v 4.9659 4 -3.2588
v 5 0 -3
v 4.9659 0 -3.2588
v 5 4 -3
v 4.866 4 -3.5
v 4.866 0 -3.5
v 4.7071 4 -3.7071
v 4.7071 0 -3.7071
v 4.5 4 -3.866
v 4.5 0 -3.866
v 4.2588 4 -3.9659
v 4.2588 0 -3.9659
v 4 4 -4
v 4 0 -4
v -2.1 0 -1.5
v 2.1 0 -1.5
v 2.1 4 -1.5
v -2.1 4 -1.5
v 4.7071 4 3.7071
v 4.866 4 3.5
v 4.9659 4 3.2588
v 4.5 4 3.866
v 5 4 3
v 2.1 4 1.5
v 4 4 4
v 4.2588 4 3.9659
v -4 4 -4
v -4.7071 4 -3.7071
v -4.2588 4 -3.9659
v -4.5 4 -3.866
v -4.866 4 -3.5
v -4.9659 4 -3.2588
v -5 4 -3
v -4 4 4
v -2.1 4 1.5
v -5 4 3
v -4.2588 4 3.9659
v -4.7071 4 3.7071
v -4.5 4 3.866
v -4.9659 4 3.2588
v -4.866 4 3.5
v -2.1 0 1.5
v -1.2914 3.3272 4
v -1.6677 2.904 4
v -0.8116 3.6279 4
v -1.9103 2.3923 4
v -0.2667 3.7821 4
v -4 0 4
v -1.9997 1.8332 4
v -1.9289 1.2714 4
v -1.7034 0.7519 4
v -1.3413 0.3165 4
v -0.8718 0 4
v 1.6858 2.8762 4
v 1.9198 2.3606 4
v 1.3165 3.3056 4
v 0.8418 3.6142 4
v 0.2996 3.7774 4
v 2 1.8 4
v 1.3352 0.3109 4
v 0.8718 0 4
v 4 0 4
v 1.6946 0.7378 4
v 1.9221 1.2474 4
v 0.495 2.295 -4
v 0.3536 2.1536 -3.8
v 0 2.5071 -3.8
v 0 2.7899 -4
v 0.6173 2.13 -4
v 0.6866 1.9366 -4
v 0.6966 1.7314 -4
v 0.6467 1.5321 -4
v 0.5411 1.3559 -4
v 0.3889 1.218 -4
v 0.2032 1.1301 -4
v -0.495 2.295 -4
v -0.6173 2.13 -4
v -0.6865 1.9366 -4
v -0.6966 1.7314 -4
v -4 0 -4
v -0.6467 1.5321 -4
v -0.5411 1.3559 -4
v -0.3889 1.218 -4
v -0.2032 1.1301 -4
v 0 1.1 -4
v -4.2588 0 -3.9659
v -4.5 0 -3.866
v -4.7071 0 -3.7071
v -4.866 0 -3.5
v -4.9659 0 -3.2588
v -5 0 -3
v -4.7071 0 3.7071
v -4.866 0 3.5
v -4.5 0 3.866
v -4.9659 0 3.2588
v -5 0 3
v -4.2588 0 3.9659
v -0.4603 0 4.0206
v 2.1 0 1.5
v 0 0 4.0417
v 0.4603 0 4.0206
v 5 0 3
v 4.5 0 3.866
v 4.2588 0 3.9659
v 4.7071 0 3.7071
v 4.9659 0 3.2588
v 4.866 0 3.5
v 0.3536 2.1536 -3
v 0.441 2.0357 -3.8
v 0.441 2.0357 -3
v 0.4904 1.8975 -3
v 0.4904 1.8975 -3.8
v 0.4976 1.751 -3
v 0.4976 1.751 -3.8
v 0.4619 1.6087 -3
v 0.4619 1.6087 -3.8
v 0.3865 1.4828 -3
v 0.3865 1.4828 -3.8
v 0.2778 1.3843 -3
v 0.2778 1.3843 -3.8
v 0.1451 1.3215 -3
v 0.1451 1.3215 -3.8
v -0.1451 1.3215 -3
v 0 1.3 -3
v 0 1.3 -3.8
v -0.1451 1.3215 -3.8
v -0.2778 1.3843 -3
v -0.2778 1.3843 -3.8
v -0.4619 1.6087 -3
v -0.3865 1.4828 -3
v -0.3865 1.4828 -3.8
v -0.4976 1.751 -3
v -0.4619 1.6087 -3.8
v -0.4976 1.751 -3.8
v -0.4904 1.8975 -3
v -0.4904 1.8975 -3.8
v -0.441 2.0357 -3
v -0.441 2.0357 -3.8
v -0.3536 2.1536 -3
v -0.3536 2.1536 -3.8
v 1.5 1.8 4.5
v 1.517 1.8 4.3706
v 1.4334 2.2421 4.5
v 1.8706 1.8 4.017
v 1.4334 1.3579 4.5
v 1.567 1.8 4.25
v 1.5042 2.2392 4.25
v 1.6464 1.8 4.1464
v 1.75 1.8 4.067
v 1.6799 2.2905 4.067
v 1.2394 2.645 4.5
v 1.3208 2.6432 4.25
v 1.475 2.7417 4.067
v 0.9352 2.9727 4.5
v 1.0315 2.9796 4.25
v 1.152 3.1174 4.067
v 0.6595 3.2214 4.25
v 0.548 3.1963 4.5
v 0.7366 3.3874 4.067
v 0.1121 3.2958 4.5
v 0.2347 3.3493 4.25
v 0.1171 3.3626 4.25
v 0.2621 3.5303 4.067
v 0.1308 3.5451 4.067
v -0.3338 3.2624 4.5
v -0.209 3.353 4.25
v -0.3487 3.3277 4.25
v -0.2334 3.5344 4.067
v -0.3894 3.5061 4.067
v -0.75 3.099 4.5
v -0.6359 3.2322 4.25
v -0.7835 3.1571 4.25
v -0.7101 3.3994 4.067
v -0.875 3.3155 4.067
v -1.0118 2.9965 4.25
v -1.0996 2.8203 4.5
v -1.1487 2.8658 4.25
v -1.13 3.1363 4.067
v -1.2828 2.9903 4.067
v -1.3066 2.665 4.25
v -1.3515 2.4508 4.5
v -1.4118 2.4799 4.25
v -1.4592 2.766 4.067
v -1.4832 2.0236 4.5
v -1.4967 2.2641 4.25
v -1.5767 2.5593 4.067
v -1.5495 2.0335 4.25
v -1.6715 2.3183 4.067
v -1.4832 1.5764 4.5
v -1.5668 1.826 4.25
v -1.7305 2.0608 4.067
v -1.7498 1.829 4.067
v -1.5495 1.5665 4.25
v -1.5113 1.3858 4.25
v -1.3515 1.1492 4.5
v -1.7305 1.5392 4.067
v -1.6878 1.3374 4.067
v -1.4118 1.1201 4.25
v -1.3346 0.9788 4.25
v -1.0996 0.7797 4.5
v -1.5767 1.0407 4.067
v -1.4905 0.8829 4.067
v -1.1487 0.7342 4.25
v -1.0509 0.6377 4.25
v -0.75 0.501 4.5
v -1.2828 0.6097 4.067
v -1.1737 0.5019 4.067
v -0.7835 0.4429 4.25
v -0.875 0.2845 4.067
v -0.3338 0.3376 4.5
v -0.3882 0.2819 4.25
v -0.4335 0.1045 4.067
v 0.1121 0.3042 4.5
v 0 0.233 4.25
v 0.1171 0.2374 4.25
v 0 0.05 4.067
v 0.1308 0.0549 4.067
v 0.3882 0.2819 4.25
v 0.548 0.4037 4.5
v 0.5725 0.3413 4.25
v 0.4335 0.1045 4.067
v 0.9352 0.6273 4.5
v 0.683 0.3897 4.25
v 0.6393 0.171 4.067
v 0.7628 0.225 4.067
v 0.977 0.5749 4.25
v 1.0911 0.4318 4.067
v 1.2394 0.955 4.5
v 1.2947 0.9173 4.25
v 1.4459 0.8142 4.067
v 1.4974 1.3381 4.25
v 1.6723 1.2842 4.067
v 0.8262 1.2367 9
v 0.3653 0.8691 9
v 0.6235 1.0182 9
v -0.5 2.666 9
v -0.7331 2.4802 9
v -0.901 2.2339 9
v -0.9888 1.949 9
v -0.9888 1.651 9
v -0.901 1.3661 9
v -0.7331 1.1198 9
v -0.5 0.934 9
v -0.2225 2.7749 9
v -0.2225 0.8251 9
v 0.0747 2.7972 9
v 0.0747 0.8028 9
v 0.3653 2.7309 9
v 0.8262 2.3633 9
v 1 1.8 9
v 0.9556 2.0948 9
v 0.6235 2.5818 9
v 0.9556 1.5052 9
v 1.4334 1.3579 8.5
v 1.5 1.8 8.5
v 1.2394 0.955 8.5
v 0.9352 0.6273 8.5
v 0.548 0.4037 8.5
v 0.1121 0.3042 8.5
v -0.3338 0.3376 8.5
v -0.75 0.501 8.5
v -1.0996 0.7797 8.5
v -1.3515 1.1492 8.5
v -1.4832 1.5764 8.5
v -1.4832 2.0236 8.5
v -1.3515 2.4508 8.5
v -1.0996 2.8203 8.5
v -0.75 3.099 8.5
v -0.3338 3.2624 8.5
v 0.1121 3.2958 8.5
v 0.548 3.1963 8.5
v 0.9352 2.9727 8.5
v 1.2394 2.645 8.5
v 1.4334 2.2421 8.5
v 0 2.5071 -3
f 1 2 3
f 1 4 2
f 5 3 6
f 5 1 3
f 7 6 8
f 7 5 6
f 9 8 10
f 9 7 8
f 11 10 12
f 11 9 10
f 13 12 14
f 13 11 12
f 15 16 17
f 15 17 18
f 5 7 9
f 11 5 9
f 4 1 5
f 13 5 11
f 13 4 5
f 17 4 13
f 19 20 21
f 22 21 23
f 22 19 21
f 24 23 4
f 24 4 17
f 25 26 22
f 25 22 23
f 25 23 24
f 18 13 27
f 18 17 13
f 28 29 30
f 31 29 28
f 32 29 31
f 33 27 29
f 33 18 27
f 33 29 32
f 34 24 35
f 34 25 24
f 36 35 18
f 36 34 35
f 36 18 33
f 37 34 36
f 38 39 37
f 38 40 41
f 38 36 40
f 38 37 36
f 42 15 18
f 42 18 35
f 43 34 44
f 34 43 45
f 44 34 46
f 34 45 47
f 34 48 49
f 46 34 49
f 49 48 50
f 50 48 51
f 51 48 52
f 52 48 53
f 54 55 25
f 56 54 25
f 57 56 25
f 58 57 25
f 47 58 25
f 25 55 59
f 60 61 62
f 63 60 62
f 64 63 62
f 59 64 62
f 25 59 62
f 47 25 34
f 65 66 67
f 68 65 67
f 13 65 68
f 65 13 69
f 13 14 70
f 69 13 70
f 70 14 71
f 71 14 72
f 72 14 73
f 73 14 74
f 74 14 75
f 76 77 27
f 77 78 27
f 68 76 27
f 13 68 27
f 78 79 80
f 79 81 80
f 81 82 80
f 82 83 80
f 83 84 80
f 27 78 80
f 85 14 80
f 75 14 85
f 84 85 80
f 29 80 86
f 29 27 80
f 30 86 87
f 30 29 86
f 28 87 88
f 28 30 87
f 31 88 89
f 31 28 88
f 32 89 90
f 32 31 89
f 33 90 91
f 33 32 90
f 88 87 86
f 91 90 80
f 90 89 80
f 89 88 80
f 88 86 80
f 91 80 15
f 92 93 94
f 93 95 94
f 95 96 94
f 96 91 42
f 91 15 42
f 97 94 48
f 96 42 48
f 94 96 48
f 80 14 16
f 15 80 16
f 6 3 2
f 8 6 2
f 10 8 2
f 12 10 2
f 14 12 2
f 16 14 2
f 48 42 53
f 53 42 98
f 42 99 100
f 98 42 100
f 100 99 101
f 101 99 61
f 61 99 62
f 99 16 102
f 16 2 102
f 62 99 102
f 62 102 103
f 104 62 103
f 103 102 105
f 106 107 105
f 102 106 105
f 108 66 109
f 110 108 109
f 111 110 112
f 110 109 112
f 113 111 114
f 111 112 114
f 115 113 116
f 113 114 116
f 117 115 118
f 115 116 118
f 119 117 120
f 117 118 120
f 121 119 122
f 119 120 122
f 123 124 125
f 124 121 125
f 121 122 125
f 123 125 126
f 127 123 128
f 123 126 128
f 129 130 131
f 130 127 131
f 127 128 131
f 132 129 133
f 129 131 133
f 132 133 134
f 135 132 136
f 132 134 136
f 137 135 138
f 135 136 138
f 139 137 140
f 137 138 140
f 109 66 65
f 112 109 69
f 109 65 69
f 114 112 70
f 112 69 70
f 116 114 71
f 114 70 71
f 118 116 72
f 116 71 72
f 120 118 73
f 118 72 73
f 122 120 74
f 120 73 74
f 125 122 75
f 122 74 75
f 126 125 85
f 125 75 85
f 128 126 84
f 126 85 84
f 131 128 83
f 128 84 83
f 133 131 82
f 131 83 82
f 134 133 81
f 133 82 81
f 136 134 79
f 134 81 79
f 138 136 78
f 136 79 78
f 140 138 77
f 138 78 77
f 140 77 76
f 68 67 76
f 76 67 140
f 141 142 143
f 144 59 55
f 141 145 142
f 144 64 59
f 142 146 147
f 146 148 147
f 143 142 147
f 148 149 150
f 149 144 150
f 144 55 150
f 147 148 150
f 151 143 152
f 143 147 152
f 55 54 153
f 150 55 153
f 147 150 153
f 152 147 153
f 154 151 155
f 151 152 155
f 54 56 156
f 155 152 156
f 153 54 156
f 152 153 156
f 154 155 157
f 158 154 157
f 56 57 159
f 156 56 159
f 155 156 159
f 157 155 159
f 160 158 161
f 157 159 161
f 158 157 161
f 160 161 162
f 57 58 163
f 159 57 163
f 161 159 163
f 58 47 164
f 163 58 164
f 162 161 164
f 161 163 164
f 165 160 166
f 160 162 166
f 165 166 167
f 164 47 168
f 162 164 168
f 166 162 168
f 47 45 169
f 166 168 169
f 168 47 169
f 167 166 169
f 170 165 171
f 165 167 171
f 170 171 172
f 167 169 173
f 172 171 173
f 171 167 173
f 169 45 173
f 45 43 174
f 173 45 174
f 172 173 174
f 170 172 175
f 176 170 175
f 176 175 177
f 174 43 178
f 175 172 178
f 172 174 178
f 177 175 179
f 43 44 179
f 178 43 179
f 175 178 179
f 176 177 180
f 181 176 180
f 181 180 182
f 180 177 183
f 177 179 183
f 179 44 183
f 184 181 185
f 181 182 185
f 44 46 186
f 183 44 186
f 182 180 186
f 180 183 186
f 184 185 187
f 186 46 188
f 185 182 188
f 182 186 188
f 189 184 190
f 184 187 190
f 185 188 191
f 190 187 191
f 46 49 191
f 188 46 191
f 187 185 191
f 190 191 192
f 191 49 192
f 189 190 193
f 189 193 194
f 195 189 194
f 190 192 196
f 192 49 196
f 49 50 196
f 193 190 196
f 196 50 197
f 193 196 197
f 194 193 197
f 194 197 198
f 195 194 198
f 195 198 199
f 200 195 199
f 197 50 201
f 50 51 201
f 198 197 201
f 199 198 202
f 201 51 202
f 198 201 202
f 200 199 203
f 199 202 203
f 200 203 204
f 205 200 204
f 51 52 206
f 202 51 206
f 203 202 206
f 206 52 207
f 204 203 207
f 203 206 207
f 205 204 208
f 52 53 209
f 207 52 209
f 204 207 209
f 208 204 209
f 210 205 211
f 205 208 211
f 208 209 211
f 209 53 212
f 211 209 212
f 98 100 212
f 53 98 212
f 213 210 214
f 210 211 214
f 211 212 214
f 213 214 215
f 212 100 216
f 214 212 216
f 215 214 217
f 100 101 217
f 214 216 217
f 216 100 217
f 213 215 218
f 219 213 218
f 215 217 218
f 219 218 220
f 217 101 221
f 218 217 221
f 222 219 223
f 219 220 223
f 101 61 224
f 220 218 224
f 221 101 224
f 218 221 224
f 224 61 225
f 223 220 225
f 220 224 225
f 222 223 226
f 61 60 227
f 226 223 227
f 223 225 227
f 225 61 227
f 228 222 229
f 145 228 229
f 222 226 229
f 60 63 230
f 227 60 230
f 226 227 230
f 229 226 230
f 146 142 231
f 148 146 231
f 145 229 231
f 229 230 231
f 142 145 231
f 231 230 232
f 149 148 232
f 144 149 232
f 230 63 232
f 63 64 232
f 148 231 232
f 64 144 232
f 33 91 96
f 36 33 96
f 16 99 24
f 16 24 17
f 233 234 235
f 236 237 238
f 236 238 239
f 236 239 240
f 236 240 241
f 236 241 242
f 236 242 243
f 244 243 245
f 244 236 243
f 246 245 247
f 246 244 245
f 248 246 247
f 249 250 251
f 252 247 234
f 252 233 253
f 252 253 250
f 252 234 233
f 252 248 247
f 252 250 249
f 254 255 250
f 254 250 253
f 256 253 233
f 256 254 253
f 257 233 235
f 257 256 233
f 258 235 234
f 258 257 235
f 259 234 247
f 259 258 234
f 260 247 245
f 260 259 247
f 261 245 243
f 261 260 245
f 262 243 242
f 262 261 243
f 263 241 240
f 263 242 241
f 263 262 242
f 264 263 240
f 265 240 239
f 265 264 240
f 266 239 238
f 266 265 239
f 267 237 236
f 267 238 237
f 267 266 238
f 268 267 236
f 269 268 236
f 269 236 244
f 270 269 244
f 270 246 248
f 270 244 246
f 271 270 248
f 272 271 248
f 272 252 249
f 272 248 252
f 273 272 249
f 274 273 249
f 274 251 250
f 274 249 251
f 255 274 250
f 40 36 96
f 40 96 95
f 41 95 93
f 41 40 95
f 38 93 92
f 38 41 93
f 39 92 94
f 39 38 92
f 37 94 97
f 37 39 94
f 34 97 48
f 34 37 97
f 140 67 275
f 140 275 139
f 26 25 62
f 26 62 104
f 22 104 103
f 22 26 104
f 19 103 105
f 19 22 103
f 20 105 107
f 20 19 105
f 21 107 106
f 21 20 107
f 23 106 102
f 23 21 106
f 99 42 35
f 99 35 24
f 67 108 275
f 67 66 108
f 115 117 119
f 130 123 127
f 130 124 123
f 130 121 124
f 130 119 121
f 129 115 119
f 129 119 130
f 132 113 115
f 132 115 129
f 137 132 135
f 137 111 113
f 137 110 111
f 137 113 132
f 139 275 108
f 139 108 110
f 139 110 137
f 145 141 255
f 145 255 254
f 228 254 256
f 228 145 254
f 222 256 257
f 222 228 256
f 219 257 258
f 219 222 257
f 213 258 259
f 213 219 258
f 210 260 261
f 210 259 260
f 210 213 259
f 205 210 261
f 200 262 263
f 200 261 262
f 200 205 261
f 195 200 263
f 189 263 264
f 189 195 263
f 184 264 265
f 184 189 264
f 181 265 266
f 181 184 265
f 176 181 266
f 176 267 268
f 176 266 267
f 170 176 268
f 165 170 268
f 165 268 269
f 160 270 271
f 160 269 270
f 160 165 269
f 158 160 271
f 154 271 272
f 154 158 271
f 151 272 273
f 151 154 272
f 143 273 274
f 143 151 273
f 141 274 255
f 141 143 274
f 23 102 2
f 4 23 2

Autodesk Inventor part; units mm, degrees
ref_plane "YZ Plane" through (0, 0, 0) normal (1, 0, 0) x (0, 1, 0)
ref_plane "XZ Plane" through (0, 0, 0) normal (0, 1, 0) x (-1, 0, 0)
ref_plane "XY Plane" through (0, 0, 0) normal (0, 0, 1) x (1, 0, 0)
sketch "Sketch1" plane through (0, 0, 0) normal (0, 1, 0) x (-1, 0, 0)
  line L0 (2.1, 1.5) -> (-2.1, 1.5)
  line L1 (-2.1, -1.5) -> (2.1, -1.5)
  line L2 (7, 0) -> (-7, 0) construction
  line L3 (0, -5.6) -> (0, 5.6) construction
  line L4 (5, 4) -> (-5, 4)
  line L5 (-5, 4) -> (-5, -4)
  line L6 (-5, -4) -> (5, -4)
  line L7 (5, -4) -> (5, 4)
  line L8 (-2, 0.84) -> (-2, -0.76) projected
  line L9 (2, -0.76) -> (2, 0.84) projected
  line L10 (-2.1, 1.5) -> (-2.1, -1.5)
  line L11 (2.1, -1.5) -> (2.1, 1.5)
  line L12 (0.2, 1.5) -> (-0.2, 1.5) projected
  point P0 (0, 0)
  point P1 (2.3, 0)
  point P2 (0, 1.5)
  dimension "d2" = 3
  dimension "d3" = 10
  dimension "d16" = 2.5
  dimension "d17" = 2.5
  dimension "d29" = 0.1
  dimension "d30" = 0.1
extrude "Extrusion1" add sketch "Sketch1" along normal blind 4
sketch "Sketch2" plane through (-5, 0, 4) normal (0, 0, 1) x (1, 0, 0)
  circle A0 centre (5, 1.8) radius 1.5
  line L0 (0, 4) -> (10, 4) construction
  line L1 (5, -1.76) -> (5, 10.56) construction
  line L2 (0, 0) -> (0, 4) projected
  arc A1 (7, 8.5082) -> (3, 8.5082) centre (5, 1.8) ccw projected
  point P0 (5, 0)
  point P1 (0, 2)
  dimension "d7" = 3
extrude "Extrusion2" add sketch "Sketch2" along normal blind 5
sketch "Sketch4" plane through (5, 0, -4) normal (0, 0, -1) x (-1, 0, 0)
  circle A0 centre (5, 1.8) radius 0.2 construction
  circle A1 centre (5, 1.8) radius 0.5
  line L0 (4.6464, 2.1536) -> (5, 2.5071)
  line L1 (5, 2.5071) -> (5.3536, 2.1536)
  point P0 (5, 0)
  dimension "d18" = 1
extrude "Extrusion4" cut sketch "Sketch4" against normal blind 1
chamfer "Chamfer2" distance 0.2 angle 45 3 edges at (-0.1768, 2.3303, -4) (0, 1.3, -4) (0.1768, 2.3303, -4)
chamfer "Chamfer3" distance 0.5 angle 45 1 edges at (-1.5, 1.8, 9)
fillet "Fillet1" radius 0.5 1 edges at (-1.5, 1.8, 4)
fillet "Fillet2" radius 1 4 edges at (-5, 2, 4) (-5, 2, -4) (5, 2, -4) (5, 2, 4)
properties part number "Pen_nib_stopper"
